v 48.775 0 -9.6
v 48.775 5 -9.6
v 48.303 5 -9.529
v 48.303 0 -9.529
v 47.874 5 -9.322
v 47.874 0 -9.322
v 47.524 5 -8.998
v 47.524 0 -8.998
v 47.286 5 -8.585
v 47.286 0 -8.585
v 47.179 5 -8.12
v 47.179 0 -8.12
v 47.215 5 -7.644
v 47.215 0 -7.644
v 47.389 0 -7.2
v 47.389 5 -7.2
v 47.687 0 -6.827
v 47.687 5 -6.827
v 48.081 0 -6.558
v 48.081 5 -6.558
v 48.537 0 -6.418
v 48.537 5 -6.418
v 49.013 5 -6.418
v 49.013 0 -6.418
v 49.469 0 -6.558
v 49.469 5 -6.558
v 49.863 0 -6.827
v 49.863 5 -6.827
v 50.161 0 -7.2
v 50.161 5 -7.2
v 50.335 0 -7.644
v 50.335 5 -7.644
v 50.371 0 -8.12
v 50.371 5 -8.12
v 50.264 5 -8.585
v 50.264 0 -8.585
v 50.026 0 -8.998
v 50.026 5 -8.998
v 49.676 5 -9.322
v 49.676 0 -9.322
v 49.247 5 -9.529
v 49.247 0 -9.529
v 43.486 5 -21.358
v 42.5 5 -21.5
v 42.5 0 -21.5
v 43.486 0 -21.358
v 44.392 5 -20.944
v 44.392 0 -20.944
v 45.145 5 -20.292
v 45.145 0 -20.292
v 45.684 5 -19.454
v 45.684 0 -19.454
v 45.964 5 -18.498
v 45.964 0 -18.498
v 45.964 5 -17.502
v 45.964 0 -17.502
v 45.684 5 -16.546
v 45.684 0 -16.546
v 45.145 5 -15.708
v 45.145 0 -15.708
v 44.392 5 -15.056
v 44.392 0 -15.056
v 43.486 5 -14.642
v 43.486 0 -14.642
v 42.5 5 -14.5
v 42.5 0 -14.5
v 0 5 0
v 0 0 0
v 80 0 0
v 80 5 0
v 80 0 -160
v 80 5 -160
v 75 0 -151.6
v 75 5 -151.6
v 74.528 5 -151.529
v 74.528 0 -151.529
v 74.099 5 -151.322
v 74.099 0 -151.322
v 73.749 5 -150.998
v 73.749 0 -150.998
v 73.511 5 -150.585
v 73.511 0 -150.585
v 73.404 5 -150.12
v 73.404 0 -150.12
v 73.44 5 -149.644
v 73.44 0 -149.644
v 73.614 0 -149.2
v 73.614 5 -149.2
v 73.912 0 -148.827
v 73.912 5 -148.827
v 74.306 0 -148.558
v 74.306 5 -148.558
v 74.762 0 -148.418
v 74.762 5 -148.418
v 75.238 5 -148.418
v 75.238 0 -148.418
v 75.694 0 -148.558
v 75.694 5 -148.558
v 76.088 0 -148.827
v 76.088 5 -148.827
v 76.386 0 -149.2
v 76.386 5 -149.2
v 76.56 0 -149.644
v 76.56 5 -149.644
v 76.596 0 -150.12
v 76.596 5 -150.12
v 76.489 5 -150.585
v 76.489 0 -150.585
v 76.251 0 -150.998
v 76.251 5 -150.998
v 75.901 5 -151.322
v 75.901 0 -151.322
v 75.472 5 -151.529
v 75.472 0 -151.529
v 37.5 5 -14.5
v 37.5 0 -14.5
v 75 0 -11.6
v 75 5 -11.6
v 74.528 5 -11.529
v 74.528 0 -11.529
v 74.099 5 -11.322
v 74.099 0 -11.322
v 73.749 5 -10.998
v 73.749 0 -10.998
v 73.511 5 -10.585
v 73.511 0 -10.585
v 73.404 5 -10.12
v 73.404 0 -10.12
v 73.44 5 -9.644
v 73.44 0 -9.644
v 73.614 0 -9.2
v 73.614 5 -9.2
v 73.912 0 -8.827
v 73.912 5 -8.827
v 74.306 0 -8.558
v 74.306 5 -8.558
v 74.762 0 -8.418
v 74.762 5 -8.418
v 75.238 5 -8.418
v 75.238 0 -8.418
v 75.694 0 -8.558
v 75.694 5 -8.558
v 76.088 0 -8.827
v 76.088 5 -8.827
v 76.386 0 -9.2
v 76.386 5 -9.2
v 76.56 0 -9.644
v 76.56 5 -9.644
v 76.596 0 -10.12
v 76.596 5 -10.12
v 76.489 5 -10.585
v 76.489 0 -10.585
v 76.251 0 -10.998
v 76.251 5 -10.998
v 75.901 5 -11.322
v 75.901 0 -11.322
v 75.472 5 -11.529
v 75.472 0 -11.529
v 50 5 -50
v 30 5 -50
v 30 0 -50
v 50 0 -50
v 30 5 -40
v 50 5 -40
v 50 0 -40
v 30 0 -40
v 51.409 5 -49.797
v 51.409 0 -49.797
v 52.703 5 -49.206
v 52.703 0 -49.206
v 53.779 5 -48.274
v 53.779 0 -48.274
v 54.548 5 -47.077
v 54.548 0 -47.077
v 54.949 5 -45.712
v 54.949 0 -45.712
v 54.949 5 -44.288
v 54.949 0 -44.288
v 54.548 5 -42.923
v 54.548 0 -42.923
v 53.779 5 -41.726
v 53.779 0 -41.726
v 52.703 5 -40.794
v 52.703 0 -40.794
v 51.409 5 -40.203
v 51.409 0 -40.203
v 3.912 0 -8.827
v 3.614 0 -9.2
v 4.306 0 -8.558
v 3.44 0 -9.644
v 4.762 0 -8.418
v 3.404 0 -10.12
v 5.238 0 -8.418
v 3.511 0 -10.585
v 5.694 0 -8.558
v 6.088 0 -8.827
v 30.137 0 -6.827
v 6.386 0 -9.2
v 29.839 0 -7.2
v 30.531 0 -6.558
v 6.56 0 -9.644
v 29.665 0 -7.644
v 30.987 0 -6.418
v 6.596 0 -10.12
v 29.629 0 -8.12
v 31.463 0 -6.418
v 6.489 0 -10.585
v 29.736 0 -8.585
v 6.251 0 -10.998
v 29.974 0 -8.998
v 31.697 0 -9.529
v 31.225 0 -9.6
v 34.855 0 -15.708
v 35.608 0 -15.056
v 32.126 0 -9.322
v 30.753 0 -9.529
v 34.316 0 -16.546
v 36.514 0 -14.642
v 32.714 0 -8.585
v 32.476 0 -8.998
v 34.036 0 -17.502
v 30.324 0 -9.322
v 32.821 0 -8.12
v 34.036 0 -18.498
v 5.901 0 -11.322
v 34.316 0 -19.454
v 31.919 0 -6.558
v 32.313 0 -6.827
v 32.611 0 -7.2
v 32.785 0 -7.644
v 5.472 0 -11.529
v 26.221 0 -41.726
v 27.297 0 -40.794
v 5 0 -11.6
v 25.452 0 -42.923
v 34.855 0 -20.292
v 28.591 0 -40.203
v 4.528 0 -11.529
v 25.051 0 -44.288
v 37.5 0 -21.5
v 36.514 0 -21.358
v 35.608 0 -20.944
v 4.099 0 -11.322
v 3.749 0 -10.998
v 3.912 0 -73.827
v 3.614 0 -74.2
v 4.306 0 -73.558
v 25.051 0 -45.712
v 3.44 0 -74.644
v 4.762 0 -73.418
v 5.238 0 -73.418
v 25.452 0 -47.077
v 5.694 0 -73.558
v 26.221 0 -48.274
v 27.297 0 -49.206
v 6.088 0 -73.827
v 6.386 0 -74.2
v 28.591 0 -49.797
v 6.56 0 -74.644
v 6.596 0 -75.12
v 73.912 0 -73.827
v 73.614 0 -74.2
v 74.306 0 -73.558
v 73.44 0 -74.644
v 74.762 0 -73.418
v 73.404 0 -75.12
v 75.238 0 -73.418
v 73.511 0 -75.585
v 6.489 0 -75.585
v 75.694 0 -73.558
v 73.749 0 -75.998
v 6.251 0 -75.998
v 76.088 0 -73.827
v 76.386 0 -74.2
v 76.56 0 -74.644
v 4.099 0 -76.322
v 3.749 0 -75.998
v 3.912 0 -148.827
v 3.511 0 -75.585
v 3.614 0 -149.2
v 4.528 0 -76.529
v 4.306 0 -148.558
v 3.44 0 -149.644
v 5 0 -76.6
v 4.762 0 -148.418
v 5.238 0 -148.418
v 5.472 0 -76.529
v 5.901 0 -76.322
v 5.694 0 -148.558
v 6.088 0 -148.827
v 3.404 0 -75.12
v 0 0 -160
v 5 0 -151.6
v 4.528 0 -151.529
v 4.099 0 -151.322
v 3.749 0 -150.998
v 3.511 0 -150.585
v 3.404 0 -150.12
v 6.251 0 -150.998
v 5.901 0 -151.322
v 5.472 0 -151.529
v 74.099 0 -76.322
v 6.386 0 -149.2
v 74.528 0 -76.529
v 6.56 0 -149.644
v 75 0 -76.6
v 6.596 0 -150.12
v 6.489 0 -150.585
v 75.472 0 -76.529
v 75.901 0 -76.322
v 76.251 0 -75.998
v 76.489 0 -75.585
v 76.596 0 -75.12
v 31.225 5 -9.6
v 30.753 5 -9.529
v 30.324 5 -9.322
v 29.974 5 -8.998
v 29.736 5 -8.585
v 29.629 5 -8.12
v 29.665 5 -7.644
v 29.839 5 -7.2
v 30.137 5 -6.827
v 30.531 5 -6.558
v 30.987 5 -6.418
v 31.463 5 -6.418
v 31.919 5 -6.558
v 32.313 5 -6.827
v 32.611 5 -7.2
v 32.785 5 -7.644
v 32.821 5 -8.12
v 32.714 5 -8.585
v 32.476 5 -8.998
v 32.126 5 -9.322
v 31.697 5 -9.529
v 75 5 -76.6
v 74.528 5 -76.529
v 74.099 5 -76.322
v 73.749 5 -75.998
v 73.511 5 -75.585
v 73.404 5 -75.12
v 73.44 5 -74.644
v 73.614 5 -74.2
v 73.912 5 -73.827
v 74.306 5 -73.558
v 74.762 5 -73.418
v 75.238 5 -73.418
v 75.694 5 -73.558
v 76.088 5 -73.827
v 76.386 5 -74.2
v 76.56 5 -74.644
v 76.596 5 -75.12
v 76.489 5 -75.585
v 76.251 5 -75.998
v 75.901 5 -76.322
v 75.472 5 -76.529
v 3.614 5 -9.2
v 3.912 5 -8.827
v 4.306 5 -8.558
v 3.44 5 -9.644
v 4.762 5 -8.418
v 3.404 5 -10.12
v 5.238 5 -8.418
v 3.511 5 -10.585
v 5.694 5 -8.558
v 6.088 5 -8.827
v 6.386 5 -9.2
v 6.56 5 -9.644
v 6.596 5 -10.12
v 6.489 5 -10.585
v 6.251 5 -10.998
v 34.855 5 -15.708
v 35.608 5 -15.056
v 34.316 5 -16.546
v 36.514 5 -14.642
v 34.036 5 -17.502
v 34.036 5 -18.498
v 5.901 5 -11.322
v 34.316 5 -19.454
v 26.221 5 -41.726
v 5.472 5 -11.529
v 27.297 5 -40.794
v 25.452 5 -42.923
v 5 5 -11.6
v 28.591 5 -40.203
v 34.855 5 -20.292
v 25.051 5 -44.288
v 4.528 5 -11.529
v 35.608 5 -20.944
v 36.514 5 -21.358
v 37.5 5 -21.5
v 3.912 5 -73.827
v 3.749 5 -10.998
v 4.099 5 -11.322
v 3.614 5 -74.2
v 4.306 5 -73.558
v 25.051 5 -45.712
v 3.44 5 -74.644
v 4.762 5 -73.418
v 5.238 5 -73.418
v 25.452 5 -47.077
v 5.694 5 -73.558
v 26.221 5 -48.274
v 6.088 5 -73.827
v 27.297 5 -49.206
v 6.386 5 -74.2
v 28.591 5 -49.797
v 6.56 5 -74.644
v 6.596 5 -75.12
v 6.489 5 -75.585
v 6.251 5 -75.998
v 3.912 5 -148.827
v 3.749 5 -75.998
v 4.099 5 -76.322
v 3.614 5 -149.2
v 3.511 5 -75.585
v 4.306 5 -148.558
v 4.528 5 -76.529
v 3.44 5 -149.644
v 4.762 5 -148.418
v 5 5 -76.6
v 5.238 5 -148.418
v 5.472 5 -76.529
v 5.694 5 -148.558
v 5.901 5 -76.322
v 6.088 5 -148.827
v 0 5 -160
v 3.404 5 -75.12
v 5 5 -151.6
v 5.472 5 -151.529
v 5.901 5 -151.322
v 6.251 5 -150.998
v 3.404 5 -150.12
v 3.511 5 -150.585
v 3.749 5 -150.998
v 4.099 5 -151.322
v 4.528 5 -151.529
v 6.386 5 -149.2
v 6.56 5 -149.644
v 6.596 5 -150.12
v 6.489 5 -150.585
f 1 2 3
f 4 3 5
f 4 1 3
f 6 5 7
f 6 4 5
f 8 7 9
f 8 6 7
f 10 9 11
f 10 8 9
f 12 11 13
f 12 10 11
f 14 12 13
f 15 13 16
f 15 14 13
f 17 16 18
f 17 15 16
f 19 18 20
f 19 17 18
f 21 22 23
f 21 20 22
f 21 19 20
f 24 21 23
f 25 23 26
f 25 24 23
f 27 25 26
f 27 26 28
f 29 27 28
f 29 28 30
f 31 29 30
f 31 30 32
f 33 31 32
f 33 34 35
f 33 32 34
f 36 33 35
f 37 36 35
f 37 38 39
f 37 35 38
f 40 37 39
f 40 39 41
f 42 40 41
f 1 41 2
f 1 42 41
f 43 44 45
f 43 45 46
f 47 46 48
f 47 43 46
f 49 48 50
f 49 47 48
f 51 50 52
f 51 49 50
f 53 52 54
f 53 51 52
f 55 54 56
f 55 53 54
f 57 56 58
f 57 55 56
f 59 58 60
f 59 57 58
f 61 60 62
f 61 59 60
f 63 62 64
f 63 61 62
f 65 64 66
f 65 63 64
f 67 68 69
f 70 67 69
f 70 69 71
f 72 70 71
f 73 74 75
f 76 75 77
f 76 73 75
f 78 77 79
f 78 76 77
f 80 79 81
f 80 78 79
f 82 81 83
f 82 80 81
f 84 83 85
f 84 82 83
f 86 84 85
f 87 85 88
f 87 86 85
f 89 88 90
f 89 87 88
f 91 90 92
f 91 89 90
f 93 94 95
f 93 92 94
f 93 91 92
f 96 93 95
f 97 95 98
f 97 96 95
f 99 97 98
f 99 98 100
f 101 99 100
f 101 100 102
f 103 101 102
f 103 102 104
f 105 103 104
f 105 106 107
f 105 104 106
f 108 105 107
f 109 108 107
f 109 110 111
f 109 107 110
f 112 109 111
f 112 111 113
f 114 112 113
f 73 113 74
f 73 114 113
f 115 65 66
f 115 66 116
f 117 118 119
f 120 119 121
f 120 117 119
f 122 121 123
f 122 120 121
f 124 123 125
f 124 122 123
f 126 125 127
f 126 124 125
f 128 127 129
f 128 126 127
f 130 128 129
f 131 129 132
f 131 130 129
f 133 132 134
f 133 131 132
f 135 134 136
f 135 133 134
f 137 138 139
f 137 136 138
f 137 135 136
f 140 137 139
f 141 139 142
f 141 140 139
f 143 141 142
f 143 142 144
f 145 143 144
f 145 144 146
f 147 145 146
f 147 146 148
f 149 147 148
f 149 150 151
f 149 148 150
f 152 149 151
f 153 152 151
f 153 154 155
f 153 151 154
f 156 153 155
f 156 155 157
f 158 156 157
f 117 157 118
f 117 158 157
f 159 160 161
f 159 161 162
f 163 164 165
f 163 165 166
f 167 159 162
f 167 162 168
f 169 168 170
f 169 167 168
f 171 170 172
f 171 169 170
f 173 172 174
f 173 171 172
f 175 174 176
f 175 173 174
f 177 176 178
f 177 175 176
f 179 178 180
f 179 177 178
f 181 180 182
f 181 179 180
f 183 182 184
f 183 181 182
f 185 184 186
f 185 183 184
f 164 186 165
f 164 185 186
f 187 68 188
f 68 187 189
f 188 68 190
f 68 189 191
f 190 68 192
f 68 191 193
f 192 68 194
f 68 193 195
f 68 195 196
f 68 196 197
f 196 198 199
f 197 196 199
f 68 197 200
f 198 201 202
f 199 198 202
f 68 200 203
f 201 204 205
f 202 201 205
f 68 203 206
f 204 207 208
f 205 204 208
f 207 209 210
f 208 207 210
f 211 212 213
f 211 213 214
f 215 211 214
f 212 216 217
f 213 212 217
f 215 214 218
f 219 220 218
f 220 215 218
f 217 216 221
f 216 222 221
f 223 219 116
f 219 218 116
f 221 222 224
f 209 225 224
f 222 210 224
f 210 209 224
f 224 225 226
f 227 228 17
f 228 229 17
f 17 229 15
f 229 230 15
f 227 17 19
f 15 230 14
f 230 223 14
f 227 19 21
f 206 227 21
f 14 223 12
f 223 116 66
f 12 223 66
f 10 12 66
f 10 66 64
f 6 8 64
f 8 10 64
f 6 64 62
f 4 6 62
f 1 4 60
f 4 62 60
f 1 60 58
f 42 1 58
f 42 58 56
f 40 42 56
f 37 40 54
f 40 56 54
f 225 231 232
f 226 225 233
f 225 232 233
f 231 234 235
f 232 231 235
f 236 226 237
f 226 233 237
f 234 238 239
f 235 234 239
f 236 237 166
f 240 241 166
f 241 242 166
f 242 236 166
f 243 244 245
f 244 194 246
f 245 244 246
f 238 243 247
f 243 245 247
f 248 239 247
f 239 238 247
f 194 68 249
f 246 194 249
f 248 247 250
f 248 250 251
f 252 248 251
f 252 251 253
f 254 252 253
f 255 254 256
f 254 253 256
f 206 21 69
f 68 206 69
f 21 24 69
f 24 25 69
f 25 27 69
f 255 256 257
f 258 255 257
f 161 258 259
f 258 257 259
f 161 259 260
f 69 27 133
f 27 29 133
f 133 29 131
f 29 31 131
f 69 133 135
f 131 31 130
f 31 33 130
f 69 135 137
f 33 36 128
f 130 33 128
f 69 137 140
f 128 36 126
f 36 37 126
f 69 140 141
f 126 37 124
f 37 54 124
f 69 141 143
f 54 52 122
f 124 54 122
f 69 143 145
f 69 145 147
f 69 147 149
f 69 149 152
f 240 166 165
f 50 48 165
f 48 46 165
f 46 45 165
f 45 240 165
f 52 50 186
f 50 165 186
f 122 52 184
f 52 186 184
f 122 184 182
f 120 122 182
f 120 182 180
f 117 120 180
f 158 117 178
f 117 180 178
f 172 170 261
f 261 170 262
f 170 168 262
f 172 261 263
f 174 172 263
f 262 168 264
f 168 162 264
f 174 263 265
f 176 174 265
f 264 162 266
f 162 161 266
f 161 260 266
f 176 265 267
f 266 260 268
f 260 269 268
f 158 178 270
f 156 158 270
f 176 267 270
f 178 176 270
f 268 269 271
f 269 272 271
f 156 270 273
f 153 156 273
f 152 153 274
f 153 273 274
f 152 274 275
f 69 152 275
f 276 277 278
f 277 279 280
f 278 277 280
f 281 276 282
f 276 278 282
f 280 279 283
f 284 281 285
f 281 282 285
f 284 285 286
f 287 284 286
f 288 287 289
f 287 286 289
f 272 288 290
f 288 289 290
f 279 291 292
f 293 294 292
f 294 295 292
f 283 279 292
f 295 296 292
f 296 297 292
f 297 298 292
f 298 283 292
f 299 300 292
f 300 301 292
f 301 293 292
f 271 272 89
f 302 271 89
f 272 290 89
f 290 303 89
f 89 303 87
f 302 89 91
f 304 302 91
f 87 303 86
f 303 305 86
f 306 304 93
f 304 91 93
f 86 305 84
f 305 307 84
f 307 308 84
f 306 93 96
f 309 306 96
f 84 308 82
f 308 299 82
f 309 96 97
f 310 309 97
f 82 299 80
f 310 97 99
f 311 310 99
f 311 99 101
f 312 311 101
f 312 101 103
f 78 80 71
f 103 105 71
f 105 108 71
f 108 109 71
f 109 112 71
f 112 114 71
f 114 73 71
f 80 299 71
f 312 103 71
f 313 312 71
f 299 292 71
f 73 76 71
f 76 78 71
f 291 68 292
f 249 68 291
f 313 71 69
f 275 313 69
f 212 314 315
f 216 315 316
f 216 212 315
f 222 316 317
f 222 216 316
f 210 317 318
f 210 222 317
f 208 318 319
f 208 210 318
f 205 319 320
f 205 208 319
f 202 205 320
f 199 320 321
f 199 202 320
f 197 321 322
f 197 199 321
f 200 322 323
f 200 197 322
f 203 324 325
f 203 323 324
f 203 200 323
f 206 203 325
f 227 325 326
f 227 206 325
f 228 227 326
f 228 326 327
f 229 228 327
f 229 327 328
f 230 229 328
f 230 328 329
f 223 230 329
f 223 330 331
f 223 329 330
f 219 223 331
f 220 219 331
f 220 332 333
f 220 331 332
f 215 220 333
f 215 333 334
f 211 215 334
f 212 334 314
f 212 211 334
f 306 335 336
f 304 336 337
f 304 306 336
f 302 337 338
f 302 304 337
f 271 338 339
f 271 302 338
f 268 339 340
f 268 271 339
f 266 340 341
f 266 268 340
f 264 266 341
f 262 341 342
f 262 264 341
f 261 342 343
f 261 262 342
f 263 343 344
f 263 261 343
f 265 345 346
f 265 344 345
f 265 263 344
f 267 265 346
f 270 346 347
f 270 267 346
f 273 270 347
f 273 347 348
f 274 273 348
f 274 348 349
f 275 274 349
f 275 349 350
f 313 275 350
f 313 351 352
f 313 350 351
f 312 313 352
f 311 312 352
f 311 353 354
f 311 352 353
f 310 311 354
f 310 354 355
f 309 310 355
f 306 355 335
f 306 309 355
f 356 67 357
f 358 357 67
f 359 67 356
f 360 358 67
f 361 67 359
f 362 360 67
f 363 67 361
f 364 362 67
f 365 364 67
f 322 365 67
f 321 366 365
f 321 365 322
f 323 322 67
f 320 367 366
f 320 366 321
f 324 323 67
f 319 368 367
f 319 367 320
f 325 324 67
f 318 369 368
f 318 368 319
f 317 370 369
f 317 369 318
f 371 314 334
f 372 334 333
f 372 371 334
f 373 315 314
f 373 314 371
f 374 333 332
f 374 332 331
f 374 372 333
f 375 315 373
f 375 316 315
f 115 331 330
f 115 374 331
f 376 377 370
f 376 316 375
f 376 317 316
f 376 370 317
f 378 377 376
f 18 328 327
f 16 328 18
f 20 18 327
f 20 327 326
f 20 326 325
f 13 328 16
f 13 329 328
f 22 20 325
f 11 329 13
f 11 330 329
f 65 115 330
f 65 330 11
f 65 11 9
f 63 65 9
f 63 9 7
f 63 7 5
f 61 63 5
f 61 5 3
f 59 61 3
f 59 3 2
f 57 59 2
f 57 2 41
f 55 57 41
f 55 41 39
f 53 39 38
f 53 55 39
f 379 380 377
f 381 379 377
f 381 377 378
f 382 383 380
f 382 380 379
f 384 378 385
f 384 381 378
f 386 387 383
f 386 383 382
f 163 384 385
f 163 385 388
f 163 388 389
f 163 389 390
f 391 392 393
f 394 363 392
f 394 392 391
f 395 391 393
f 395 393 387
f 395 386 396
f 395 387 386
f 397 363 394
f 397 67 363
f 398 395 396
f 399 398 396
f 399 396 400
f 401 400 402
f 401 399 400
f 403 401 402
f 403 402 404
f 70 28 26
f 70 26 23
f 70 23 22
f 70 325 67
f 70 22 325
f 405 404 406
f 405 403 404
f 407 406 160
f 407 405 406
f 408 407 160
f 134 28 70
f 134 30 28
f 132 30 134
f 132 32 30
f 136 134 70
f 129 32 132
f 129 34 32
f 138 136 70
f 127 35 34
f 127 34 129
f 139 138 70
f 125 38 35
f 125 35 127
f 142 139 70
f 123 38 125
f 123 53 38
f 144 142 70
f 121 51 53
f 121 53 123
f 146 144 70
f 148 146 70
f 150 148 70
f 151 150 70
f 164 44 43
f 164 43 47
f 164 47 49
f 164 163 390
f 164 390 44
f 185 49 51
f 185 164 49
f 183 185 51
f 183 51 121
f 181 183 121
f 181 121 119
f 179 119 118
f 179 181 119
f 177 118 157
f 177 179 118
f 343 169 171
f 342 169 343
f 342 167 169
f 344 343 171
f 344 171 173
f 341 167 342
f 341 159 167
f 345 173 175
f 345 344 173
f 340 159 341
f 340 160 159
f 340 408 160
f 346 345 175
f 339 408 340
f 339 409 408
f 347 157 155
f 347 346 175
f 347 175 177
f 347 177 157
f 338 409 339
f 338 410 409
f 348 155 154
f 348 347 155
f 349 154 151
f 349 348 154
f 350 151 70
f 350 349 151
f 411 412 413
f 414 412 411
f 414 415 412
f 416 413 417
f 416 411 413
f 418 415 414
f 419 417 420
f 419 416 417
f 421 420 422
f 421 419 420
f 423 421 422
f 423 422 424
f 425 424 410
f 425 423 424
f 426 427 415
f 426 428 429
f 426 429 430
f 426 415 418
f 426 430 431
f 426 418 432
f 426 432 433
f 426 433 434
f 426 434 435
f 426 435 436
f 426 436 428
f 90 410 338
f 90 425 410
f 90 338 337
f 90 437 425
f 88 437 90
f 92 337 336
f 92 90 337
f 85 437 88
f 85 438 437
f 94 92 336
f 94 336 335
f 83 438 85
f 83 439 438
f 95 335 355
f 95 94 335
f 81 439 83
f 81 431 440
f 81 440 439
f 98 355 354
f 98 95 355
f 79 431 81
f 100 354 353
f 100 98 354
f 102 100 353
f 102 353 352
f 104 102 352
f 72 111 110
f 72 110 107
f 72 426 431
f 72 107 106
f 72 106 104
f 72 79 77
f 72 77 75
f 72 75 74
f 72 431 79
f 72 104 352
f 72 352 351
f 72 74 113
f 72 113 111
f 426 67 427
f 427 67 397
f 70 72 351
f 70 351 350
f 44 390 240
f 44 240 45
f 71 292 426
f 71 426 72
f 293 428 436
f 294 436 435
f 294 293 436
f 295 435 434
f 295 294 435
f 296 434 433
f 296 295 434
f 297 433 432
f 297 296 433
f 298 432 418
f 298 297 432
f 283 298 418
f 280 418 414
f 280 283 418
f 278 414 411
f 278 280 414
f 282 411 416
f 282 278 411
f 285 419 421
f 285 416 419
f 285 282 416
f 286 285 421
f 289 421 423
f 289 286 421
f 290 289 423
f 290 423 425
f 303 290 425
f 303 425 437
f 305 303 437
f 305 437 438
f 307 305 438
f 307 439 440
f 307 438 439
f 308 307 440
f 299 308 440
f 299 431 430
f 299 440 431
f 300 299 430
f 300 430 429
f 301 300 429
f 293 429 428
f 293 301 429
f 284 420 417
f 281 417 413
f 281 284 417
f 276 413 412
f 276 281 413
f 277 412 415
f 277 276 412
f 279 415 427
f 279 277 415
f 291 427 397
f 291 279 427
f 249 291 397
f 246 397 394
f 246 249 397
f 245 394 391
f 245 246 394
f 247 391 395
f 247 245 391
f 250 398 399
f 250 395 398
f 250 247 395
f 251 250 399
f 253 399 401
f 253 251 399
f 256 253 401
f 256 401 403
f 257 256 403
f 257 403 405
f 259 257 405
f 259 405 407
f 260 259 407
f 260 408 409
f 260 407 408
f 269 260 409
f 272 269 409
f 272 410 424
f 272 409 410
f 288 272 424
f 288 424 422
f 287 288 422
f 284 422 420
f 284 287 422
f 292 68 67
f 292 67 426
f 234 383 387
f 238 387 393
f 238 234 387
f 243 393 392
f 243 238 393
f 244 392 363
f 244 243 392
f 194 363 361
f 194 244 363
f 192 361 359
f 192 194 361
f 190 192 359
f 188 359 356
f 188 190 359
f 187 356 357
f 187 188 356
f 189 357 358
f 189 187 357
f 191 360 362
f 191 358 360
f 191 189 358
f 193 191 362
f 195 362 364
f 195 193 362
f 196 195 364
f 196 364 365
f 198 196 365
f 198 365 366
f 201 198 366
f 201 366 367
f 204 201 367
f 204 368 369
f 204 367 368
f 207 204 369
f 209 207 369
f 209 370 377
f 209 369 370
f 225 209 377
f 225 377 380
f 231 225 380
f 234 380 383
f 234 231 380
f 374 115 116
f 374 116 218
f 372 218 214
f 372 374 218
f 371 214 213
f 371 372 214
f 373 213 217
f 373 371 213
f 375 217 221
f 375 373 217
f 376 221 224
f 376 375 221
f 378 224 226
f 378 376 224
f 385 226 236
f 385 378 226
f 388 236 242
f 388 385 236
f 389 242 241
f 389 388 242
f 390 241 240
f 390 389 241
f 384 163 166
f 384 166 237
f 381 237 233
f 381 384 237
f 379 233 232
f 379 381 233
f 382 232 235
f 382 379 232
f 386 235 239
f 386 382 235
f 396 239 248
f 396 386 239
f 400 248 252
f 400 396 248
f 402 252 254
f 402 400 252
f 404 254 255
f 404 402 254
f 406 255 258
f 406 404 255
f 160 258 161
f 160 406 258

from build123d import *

# Parameters (mm, degrees)
ESQUISSE1_W              = 80
ESQUISSE1_H              = 160
BOSS_EXTRU_1_DEPTH       = 5
ESQUISSE2_R              = 1.6
ENL_V_MAT_EXTRU_8_DEPTH  = 10
ESQUISSE3_R              = 1.6
ENL_V_MAT_EXTRU_10_DEPTH = 10
ENL_V_MAT_EXTRU_11_DEPTH = 179.955301682


with BuildPart() as part:
    # Esquisse1 → Boss.-Extru.1 (new body)
    with BuildSketch(Plane(origin=(0, 0, 0), x_dir=(1, 0, 0), z_dir=(0, 1, 0))):
        with Locations((40, 80)):
            Rectangle(ESQUISSE1_W, ESQUISSE1_H)
    extrude(amount=BOSS_EXTRU_1_DEPTH)

    # Esquisse2 → Enlèv. mat.-Extru.8 (cut)
    with BuildSketch(Plane(origin=(0, 0, 0), x_dir=(1, 0, 0), z_dir=(0, 1, 0))):
        with Locations(Location((5, 150, 0), (0, 0, 90))):
            Circle(ESQUISSE2_R)
        with Locations(Location((5, 75, 0), (0, 0, 90))):
            Circle(ESQUISSE2_R)
        with Locations(Location((5, 10, 0), (0, 0, 90))):
            Circle(ESQUISSE2_R)
        with Locations(Location((75, 10, 0), (0, 0, 90))):
            Circle(ESQUISSE2_R)
        with Locations(Location((75, 75, 0), (0, 0, 90))):
            Circle(ESQUISSE2_R)
        with Locations(Location((75, 150, 0), (0, 0, 90))):
            Circle(ESQUISSE2_R)
    extrude(amount=ENL_V_MAT_EXTRU_8_DEPTH, mode=Mode.SUBTRACT)

    # Esquisse3 → Enlèv. mat.-Extru.10 (cut)
    with BuildSketch(Plane(origin=(0, 0, 0), x_dir=(1, 0, 0), z_dir=(0, 1, 0))):
        with Locations(Location((31.225, 8, 0), (0, 0, 90))):
            Circle(ESQUISSE3_R)
        with Locations(Location((48.775, 8, 0), (0, 0, 90))):
            Circle(ESQUISSE3_R)
    extrude(amount=ENL_V_MAT_EXTRU_10_DEPTH, mode=Mode.SUBTRACT)

    # Esquisse4 → Enlèv. mat.-Extru.11 (cut, through all)
    with BuildSketch(Plane(origin=(0, 5, 0), x_dir=(1, 0, 0), z_dir=(0, 1, 0))):
        with BuildLine():
            Line((37.5, 21.5), (42.5, 21.5))
            ThreePointArc((42.5, 21.5), (46, 18), (42.5, 14.5))
            Line((42.5, 14.5), (37.5, 14.5))
            ThreePointArc((37.5, 14.5), (34, 18), (37.5, 21.5))
        make_face()
        with BuildLine():
            Line((30, 50), (50, 50))
            ThreePointArc((50, 50), (55, 45), (50, 40))
            Line((50, 40), (30, 40))
            ThreePointArc((30, 40), (25, 45), (30, 50))
        make_face()
    extrude(amount=-ENL_V_MAT_EXTRU_11_DEPTH, mode=Mode.SUBTRACT)


solid = part.part
